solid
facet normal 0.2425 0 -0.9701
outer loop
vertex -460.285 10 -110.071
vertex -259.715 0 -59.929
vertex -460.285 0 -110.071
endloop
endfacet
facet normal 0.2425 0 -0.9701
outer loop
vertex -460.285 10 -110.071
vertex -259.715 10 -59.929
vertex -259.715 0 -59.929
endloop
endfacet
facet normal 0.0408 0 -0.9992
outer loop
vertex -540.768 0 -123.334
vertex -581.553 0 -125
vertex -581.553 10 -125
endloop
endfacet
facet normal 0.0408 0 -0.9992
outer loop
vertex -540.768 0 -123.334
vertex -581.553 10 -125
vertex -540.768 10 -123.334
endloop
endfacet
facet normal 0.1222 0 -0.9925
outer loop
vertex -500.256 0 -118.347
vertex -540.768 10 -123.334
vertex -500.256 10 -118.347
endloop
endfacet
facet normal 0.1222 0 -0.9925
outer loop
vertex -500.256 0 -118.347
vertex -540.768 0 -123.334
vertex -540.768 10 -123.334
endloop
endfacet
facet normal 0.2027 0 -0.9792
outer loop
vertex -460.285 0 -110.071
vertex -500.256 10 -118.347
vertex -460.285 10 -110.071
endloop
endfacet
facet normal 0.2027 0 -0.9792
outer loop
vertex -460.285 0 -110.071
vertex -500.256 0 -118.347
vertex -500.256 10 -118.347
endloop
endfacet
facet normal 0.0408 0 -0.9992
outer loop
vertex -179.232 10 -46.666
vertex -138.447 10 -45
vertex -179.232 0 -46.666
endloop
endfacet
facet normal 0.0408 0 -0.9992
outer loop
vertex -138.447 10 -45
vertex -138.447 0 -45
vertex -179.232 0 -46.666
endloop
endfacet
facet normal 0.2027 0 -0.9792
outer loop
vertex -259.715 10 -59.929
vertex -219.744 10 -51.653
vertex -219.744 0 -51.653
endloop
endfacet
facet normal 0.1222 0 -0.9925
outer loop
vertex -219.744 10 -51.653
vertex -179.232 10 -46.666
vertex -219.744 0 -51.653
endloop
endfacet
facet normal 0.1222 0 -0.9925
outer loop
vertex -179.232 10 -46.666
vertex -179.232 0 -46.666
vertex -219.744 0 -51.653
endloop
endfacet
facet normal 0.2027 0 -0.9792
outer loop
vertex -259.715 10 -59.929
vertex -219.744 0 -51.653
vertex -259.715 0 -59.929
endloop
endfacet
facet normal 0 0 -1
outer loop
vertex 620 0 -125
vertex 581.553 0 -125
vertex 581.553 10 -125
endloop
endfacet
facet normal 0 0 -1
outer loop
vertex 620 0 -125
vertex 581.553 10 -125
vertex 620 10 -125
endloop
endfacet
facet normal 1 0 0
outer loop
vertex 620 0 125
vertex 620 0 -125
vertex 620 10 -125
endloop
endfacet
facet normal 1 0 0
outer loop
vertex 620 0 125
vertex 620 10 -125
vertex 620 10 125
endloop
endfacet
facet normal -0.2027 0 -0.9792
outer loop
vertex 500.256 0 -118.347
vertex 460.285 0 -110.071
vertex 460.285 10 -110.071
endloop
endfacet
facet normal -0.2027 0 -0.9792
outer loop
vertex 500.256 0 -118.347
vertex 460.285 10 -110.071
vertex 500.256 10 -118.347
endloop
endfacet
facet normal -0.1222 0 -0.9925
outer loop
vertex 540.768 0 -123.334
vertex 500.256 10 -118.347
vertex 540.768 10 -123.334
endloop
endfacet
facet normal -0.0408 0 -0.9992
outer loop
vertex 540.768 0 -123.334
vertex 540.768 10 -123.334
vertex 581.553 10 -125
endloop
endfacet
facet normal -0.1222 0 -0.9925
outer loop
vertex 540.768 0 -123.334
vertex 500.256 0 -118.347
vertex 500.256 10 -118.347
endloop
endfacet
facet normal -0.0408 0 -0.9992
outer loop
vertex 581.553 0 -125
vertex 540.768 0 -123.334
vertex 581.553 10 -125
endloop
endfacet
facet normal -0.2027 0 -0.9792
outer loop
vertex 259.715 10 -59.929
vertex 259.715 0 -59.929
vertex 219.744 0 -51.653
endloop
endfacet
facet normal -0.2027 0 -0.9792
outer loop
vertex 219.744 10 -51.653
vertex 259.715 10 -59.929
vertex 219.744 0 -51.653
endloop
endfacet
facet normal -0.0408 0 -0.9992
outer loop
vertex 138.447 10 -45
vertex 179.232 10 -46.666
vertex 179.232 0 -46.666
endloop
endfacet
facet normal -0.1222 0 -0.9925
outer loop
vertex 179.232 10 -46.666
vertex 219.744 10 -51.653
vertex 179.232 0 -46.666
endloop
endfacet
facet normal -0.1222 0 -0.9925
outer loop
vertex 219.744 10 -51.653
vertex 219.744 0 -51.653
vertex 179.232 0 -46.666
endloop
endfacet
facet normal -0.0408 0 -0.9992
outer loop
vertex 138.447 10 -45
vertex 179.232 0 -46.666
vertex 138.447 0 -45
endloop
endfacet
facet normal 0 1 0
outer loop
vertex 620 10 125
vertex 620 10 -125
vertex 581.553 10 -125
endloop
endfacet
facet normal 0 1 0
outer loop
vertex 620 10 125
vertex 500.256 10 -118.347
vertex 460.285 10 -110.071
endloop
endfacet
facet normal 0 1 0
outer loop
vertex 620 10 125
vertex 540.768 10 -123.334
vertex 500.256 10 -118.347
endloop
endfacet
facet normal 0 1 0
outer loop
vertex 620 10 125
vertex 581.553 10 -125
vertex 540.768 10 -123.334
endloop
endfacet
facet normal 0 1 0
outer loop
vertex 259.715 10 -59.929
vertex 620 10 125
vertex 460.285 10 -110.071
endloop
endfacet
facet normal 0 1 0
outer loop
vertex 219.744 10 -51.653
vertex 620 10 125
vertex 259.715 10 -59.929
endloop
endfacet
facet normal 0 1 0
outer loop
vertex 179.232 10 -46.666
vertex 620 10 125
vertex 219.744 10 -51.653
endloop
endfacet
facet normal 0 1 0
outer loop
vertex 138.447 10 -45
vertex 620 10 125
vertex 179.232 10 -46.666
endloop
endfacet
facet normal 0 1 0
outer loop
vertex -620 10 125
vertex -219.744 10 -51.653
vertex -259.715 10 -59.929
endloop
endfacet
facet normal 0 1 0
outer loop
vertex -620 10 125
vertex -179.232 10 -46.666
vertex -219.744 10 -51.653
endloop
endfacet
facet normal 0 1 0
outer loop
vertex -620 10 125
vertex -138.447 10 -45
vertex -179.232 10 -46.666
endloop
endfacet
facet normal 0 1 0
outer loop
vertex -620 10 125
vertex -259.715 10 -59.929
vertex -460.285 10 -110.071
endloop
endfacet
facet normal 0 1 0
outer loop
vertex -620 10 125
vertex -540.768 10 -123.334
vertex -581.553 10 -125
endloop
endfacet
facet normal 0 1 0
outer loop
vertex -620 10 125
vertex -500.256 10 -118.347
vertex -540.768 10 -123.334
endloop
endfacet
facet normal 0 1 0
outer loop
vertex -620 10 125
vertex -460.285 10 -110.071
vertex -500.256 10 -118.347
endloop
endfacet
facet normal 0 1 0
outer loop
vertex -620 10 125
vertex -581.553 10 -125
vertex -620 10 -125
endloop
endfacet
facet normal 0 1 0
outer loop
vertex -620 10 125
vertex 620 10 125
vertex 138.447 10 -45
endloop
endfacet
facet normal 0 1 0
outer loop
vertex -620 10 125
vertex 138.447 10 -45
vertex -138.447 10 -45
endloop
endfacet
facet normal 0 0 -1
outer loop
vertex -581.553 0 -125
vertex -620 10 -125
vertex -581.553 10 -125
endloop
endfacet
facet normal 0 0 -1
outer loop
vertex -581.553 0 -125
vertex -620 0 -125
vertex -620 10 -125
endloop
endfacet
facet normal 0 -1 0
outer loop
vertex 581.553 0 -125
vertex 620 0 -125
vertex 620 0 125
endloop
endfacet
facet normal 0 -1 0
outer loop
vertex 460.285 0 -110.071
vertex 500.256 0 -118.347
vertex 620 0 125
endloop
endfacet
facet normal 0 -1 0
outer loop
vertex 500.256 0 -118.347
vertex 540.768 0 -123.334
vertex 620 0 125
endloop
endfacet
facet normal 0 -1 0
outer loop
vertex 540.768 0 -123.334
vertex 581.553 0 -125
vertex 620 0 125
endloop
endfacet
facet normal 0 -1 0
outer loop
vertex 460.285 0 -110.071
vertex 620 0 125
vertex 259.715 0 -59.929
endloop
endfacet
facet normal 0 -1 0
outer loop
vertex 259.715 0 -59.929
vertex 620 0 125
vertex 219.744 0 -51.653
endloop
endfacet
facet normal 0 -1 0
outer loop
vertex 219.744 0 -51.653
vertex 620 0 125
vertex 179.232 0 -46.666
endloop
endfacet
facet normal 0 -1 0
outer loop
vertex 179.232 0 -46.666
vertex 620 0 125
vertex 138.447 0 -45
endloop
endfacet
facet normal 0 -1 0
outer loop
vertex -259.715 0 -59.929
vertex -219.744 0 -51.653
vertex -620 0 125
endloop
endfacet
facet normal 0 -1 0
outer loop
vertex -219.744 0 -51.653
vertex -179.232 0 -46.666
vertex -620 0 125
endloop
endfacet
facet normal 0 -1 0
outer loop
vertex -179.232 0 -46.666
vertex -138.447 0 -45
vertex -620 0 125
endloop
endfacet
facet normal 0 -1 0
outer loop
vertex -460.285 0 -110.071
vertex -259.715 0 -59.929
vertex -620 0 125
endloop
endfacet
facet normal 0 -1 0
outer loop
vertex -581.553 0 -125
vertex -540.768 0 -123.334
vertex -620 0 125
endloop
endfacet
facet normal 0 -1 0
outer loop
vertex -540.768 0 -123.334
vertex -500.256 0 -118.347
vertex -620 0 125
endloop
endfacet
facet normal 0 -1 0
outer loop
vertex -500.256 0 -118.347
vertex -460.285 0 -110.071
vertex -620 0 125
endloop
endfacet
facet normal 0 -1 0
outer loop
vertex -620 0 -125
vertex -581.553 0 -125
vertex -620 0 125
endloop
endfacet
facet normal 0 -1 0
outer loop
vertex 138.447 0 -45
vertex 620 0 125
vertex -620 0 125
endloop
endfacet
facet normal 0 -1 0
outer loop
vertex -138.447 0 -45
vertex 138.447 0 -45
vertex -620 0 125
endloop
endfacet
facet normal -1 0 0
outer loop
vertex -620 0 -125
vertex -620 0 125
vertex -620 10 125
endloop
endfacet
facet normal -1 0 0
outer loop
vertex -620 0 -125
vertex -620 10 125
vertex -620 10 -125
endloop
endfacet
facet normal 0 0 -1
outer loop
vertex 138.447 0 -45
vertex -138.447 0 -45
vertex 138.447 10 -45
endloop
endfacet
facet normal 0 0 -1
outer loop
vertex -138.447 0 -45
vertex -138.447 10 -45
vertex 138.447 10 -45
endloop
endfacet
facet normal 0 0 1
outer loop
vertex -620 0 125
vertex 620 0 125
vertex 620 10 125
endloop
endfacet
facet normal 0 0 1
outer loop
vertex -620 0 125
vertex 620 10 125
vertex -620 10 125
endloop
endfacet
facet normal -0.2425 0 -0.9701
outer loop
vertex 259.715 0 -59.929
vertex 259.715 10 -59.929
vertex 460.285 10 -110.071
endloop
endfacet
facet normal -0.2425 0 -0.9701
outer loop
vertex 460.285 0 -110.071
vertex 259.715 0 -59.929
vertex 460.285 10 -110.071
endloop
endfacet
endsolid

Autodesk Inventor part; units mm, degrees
ref_plane "YZ Plane" through (0, 0, 0) normal (1, 0, 0) x (0, 1, 0)
ref_plane "XZ Plane" through (0, 0, 0) normal (0, 1, 0) x (-1, 0, 0)
ref_plane "XY Plane" through (0, 0, 0) normal (0, 0, 1) x (1, 0, 0)
sketch "スケッチ1" plane through (0, 0, 0) normal (0, 1, 0) x (-1, 0, 0)
  line L0 (620, -125) -> (-620, -125)
  line L1 (-620, -125) -> (-620, 125)
  line L2 (-620, 125) -> (620, 125)
  line L3 (620, 125) -> (620, -125)
  line L4 (0, -175) -> (0, 175) projected
  line L5 (868, 0) -> (-868, 0) projected
  point P0 (0, 0)
  point P1 (0, -125)
  point P2 (620, 0)
  dimension "d0" = 1240
  dimension "d1" = 250
extrude "押し出し1" add sketch "スケッチ1" along normal blind 10
sketch "スケッチ2" plane through (0, 10, 0) normal (0, 1, 0) x (1, 0, 0)
  line L0 (0, 175) -> (0, -175) projected
  line L1 (0, 45) -> (200, 45)
  line L2 (200, 45) -> (520, 125)
  line L3 (620, 125) -> (-620, 125) projected
  line L4 (0, 45) -> (-200, 45)
  line L5 (-200, 45) -> (-520, 125)
  line L6 (620, -125) -> (620, 125) projected
  line L7 (-520, 125) -> (520, 125)
  line L8 (-620, -125) -> (620, -125) projected
  point P0 (0, 0)
  dimension "d5" = 200
  dimension "d6" = 100
  dimension "d10" = 170
extrude "押し出し2" cut sketch "スケッチ2" against normal through all contours L3 L2 L1 L0 | L0 L4 L5 L3
fillet "フィレット1" radius 500 4 edges at (-520, 5, -125) (-200, 5, -45) (200, 5, -45) (520, 5, -125)
properties part number "type7_base" material "CFRP"
